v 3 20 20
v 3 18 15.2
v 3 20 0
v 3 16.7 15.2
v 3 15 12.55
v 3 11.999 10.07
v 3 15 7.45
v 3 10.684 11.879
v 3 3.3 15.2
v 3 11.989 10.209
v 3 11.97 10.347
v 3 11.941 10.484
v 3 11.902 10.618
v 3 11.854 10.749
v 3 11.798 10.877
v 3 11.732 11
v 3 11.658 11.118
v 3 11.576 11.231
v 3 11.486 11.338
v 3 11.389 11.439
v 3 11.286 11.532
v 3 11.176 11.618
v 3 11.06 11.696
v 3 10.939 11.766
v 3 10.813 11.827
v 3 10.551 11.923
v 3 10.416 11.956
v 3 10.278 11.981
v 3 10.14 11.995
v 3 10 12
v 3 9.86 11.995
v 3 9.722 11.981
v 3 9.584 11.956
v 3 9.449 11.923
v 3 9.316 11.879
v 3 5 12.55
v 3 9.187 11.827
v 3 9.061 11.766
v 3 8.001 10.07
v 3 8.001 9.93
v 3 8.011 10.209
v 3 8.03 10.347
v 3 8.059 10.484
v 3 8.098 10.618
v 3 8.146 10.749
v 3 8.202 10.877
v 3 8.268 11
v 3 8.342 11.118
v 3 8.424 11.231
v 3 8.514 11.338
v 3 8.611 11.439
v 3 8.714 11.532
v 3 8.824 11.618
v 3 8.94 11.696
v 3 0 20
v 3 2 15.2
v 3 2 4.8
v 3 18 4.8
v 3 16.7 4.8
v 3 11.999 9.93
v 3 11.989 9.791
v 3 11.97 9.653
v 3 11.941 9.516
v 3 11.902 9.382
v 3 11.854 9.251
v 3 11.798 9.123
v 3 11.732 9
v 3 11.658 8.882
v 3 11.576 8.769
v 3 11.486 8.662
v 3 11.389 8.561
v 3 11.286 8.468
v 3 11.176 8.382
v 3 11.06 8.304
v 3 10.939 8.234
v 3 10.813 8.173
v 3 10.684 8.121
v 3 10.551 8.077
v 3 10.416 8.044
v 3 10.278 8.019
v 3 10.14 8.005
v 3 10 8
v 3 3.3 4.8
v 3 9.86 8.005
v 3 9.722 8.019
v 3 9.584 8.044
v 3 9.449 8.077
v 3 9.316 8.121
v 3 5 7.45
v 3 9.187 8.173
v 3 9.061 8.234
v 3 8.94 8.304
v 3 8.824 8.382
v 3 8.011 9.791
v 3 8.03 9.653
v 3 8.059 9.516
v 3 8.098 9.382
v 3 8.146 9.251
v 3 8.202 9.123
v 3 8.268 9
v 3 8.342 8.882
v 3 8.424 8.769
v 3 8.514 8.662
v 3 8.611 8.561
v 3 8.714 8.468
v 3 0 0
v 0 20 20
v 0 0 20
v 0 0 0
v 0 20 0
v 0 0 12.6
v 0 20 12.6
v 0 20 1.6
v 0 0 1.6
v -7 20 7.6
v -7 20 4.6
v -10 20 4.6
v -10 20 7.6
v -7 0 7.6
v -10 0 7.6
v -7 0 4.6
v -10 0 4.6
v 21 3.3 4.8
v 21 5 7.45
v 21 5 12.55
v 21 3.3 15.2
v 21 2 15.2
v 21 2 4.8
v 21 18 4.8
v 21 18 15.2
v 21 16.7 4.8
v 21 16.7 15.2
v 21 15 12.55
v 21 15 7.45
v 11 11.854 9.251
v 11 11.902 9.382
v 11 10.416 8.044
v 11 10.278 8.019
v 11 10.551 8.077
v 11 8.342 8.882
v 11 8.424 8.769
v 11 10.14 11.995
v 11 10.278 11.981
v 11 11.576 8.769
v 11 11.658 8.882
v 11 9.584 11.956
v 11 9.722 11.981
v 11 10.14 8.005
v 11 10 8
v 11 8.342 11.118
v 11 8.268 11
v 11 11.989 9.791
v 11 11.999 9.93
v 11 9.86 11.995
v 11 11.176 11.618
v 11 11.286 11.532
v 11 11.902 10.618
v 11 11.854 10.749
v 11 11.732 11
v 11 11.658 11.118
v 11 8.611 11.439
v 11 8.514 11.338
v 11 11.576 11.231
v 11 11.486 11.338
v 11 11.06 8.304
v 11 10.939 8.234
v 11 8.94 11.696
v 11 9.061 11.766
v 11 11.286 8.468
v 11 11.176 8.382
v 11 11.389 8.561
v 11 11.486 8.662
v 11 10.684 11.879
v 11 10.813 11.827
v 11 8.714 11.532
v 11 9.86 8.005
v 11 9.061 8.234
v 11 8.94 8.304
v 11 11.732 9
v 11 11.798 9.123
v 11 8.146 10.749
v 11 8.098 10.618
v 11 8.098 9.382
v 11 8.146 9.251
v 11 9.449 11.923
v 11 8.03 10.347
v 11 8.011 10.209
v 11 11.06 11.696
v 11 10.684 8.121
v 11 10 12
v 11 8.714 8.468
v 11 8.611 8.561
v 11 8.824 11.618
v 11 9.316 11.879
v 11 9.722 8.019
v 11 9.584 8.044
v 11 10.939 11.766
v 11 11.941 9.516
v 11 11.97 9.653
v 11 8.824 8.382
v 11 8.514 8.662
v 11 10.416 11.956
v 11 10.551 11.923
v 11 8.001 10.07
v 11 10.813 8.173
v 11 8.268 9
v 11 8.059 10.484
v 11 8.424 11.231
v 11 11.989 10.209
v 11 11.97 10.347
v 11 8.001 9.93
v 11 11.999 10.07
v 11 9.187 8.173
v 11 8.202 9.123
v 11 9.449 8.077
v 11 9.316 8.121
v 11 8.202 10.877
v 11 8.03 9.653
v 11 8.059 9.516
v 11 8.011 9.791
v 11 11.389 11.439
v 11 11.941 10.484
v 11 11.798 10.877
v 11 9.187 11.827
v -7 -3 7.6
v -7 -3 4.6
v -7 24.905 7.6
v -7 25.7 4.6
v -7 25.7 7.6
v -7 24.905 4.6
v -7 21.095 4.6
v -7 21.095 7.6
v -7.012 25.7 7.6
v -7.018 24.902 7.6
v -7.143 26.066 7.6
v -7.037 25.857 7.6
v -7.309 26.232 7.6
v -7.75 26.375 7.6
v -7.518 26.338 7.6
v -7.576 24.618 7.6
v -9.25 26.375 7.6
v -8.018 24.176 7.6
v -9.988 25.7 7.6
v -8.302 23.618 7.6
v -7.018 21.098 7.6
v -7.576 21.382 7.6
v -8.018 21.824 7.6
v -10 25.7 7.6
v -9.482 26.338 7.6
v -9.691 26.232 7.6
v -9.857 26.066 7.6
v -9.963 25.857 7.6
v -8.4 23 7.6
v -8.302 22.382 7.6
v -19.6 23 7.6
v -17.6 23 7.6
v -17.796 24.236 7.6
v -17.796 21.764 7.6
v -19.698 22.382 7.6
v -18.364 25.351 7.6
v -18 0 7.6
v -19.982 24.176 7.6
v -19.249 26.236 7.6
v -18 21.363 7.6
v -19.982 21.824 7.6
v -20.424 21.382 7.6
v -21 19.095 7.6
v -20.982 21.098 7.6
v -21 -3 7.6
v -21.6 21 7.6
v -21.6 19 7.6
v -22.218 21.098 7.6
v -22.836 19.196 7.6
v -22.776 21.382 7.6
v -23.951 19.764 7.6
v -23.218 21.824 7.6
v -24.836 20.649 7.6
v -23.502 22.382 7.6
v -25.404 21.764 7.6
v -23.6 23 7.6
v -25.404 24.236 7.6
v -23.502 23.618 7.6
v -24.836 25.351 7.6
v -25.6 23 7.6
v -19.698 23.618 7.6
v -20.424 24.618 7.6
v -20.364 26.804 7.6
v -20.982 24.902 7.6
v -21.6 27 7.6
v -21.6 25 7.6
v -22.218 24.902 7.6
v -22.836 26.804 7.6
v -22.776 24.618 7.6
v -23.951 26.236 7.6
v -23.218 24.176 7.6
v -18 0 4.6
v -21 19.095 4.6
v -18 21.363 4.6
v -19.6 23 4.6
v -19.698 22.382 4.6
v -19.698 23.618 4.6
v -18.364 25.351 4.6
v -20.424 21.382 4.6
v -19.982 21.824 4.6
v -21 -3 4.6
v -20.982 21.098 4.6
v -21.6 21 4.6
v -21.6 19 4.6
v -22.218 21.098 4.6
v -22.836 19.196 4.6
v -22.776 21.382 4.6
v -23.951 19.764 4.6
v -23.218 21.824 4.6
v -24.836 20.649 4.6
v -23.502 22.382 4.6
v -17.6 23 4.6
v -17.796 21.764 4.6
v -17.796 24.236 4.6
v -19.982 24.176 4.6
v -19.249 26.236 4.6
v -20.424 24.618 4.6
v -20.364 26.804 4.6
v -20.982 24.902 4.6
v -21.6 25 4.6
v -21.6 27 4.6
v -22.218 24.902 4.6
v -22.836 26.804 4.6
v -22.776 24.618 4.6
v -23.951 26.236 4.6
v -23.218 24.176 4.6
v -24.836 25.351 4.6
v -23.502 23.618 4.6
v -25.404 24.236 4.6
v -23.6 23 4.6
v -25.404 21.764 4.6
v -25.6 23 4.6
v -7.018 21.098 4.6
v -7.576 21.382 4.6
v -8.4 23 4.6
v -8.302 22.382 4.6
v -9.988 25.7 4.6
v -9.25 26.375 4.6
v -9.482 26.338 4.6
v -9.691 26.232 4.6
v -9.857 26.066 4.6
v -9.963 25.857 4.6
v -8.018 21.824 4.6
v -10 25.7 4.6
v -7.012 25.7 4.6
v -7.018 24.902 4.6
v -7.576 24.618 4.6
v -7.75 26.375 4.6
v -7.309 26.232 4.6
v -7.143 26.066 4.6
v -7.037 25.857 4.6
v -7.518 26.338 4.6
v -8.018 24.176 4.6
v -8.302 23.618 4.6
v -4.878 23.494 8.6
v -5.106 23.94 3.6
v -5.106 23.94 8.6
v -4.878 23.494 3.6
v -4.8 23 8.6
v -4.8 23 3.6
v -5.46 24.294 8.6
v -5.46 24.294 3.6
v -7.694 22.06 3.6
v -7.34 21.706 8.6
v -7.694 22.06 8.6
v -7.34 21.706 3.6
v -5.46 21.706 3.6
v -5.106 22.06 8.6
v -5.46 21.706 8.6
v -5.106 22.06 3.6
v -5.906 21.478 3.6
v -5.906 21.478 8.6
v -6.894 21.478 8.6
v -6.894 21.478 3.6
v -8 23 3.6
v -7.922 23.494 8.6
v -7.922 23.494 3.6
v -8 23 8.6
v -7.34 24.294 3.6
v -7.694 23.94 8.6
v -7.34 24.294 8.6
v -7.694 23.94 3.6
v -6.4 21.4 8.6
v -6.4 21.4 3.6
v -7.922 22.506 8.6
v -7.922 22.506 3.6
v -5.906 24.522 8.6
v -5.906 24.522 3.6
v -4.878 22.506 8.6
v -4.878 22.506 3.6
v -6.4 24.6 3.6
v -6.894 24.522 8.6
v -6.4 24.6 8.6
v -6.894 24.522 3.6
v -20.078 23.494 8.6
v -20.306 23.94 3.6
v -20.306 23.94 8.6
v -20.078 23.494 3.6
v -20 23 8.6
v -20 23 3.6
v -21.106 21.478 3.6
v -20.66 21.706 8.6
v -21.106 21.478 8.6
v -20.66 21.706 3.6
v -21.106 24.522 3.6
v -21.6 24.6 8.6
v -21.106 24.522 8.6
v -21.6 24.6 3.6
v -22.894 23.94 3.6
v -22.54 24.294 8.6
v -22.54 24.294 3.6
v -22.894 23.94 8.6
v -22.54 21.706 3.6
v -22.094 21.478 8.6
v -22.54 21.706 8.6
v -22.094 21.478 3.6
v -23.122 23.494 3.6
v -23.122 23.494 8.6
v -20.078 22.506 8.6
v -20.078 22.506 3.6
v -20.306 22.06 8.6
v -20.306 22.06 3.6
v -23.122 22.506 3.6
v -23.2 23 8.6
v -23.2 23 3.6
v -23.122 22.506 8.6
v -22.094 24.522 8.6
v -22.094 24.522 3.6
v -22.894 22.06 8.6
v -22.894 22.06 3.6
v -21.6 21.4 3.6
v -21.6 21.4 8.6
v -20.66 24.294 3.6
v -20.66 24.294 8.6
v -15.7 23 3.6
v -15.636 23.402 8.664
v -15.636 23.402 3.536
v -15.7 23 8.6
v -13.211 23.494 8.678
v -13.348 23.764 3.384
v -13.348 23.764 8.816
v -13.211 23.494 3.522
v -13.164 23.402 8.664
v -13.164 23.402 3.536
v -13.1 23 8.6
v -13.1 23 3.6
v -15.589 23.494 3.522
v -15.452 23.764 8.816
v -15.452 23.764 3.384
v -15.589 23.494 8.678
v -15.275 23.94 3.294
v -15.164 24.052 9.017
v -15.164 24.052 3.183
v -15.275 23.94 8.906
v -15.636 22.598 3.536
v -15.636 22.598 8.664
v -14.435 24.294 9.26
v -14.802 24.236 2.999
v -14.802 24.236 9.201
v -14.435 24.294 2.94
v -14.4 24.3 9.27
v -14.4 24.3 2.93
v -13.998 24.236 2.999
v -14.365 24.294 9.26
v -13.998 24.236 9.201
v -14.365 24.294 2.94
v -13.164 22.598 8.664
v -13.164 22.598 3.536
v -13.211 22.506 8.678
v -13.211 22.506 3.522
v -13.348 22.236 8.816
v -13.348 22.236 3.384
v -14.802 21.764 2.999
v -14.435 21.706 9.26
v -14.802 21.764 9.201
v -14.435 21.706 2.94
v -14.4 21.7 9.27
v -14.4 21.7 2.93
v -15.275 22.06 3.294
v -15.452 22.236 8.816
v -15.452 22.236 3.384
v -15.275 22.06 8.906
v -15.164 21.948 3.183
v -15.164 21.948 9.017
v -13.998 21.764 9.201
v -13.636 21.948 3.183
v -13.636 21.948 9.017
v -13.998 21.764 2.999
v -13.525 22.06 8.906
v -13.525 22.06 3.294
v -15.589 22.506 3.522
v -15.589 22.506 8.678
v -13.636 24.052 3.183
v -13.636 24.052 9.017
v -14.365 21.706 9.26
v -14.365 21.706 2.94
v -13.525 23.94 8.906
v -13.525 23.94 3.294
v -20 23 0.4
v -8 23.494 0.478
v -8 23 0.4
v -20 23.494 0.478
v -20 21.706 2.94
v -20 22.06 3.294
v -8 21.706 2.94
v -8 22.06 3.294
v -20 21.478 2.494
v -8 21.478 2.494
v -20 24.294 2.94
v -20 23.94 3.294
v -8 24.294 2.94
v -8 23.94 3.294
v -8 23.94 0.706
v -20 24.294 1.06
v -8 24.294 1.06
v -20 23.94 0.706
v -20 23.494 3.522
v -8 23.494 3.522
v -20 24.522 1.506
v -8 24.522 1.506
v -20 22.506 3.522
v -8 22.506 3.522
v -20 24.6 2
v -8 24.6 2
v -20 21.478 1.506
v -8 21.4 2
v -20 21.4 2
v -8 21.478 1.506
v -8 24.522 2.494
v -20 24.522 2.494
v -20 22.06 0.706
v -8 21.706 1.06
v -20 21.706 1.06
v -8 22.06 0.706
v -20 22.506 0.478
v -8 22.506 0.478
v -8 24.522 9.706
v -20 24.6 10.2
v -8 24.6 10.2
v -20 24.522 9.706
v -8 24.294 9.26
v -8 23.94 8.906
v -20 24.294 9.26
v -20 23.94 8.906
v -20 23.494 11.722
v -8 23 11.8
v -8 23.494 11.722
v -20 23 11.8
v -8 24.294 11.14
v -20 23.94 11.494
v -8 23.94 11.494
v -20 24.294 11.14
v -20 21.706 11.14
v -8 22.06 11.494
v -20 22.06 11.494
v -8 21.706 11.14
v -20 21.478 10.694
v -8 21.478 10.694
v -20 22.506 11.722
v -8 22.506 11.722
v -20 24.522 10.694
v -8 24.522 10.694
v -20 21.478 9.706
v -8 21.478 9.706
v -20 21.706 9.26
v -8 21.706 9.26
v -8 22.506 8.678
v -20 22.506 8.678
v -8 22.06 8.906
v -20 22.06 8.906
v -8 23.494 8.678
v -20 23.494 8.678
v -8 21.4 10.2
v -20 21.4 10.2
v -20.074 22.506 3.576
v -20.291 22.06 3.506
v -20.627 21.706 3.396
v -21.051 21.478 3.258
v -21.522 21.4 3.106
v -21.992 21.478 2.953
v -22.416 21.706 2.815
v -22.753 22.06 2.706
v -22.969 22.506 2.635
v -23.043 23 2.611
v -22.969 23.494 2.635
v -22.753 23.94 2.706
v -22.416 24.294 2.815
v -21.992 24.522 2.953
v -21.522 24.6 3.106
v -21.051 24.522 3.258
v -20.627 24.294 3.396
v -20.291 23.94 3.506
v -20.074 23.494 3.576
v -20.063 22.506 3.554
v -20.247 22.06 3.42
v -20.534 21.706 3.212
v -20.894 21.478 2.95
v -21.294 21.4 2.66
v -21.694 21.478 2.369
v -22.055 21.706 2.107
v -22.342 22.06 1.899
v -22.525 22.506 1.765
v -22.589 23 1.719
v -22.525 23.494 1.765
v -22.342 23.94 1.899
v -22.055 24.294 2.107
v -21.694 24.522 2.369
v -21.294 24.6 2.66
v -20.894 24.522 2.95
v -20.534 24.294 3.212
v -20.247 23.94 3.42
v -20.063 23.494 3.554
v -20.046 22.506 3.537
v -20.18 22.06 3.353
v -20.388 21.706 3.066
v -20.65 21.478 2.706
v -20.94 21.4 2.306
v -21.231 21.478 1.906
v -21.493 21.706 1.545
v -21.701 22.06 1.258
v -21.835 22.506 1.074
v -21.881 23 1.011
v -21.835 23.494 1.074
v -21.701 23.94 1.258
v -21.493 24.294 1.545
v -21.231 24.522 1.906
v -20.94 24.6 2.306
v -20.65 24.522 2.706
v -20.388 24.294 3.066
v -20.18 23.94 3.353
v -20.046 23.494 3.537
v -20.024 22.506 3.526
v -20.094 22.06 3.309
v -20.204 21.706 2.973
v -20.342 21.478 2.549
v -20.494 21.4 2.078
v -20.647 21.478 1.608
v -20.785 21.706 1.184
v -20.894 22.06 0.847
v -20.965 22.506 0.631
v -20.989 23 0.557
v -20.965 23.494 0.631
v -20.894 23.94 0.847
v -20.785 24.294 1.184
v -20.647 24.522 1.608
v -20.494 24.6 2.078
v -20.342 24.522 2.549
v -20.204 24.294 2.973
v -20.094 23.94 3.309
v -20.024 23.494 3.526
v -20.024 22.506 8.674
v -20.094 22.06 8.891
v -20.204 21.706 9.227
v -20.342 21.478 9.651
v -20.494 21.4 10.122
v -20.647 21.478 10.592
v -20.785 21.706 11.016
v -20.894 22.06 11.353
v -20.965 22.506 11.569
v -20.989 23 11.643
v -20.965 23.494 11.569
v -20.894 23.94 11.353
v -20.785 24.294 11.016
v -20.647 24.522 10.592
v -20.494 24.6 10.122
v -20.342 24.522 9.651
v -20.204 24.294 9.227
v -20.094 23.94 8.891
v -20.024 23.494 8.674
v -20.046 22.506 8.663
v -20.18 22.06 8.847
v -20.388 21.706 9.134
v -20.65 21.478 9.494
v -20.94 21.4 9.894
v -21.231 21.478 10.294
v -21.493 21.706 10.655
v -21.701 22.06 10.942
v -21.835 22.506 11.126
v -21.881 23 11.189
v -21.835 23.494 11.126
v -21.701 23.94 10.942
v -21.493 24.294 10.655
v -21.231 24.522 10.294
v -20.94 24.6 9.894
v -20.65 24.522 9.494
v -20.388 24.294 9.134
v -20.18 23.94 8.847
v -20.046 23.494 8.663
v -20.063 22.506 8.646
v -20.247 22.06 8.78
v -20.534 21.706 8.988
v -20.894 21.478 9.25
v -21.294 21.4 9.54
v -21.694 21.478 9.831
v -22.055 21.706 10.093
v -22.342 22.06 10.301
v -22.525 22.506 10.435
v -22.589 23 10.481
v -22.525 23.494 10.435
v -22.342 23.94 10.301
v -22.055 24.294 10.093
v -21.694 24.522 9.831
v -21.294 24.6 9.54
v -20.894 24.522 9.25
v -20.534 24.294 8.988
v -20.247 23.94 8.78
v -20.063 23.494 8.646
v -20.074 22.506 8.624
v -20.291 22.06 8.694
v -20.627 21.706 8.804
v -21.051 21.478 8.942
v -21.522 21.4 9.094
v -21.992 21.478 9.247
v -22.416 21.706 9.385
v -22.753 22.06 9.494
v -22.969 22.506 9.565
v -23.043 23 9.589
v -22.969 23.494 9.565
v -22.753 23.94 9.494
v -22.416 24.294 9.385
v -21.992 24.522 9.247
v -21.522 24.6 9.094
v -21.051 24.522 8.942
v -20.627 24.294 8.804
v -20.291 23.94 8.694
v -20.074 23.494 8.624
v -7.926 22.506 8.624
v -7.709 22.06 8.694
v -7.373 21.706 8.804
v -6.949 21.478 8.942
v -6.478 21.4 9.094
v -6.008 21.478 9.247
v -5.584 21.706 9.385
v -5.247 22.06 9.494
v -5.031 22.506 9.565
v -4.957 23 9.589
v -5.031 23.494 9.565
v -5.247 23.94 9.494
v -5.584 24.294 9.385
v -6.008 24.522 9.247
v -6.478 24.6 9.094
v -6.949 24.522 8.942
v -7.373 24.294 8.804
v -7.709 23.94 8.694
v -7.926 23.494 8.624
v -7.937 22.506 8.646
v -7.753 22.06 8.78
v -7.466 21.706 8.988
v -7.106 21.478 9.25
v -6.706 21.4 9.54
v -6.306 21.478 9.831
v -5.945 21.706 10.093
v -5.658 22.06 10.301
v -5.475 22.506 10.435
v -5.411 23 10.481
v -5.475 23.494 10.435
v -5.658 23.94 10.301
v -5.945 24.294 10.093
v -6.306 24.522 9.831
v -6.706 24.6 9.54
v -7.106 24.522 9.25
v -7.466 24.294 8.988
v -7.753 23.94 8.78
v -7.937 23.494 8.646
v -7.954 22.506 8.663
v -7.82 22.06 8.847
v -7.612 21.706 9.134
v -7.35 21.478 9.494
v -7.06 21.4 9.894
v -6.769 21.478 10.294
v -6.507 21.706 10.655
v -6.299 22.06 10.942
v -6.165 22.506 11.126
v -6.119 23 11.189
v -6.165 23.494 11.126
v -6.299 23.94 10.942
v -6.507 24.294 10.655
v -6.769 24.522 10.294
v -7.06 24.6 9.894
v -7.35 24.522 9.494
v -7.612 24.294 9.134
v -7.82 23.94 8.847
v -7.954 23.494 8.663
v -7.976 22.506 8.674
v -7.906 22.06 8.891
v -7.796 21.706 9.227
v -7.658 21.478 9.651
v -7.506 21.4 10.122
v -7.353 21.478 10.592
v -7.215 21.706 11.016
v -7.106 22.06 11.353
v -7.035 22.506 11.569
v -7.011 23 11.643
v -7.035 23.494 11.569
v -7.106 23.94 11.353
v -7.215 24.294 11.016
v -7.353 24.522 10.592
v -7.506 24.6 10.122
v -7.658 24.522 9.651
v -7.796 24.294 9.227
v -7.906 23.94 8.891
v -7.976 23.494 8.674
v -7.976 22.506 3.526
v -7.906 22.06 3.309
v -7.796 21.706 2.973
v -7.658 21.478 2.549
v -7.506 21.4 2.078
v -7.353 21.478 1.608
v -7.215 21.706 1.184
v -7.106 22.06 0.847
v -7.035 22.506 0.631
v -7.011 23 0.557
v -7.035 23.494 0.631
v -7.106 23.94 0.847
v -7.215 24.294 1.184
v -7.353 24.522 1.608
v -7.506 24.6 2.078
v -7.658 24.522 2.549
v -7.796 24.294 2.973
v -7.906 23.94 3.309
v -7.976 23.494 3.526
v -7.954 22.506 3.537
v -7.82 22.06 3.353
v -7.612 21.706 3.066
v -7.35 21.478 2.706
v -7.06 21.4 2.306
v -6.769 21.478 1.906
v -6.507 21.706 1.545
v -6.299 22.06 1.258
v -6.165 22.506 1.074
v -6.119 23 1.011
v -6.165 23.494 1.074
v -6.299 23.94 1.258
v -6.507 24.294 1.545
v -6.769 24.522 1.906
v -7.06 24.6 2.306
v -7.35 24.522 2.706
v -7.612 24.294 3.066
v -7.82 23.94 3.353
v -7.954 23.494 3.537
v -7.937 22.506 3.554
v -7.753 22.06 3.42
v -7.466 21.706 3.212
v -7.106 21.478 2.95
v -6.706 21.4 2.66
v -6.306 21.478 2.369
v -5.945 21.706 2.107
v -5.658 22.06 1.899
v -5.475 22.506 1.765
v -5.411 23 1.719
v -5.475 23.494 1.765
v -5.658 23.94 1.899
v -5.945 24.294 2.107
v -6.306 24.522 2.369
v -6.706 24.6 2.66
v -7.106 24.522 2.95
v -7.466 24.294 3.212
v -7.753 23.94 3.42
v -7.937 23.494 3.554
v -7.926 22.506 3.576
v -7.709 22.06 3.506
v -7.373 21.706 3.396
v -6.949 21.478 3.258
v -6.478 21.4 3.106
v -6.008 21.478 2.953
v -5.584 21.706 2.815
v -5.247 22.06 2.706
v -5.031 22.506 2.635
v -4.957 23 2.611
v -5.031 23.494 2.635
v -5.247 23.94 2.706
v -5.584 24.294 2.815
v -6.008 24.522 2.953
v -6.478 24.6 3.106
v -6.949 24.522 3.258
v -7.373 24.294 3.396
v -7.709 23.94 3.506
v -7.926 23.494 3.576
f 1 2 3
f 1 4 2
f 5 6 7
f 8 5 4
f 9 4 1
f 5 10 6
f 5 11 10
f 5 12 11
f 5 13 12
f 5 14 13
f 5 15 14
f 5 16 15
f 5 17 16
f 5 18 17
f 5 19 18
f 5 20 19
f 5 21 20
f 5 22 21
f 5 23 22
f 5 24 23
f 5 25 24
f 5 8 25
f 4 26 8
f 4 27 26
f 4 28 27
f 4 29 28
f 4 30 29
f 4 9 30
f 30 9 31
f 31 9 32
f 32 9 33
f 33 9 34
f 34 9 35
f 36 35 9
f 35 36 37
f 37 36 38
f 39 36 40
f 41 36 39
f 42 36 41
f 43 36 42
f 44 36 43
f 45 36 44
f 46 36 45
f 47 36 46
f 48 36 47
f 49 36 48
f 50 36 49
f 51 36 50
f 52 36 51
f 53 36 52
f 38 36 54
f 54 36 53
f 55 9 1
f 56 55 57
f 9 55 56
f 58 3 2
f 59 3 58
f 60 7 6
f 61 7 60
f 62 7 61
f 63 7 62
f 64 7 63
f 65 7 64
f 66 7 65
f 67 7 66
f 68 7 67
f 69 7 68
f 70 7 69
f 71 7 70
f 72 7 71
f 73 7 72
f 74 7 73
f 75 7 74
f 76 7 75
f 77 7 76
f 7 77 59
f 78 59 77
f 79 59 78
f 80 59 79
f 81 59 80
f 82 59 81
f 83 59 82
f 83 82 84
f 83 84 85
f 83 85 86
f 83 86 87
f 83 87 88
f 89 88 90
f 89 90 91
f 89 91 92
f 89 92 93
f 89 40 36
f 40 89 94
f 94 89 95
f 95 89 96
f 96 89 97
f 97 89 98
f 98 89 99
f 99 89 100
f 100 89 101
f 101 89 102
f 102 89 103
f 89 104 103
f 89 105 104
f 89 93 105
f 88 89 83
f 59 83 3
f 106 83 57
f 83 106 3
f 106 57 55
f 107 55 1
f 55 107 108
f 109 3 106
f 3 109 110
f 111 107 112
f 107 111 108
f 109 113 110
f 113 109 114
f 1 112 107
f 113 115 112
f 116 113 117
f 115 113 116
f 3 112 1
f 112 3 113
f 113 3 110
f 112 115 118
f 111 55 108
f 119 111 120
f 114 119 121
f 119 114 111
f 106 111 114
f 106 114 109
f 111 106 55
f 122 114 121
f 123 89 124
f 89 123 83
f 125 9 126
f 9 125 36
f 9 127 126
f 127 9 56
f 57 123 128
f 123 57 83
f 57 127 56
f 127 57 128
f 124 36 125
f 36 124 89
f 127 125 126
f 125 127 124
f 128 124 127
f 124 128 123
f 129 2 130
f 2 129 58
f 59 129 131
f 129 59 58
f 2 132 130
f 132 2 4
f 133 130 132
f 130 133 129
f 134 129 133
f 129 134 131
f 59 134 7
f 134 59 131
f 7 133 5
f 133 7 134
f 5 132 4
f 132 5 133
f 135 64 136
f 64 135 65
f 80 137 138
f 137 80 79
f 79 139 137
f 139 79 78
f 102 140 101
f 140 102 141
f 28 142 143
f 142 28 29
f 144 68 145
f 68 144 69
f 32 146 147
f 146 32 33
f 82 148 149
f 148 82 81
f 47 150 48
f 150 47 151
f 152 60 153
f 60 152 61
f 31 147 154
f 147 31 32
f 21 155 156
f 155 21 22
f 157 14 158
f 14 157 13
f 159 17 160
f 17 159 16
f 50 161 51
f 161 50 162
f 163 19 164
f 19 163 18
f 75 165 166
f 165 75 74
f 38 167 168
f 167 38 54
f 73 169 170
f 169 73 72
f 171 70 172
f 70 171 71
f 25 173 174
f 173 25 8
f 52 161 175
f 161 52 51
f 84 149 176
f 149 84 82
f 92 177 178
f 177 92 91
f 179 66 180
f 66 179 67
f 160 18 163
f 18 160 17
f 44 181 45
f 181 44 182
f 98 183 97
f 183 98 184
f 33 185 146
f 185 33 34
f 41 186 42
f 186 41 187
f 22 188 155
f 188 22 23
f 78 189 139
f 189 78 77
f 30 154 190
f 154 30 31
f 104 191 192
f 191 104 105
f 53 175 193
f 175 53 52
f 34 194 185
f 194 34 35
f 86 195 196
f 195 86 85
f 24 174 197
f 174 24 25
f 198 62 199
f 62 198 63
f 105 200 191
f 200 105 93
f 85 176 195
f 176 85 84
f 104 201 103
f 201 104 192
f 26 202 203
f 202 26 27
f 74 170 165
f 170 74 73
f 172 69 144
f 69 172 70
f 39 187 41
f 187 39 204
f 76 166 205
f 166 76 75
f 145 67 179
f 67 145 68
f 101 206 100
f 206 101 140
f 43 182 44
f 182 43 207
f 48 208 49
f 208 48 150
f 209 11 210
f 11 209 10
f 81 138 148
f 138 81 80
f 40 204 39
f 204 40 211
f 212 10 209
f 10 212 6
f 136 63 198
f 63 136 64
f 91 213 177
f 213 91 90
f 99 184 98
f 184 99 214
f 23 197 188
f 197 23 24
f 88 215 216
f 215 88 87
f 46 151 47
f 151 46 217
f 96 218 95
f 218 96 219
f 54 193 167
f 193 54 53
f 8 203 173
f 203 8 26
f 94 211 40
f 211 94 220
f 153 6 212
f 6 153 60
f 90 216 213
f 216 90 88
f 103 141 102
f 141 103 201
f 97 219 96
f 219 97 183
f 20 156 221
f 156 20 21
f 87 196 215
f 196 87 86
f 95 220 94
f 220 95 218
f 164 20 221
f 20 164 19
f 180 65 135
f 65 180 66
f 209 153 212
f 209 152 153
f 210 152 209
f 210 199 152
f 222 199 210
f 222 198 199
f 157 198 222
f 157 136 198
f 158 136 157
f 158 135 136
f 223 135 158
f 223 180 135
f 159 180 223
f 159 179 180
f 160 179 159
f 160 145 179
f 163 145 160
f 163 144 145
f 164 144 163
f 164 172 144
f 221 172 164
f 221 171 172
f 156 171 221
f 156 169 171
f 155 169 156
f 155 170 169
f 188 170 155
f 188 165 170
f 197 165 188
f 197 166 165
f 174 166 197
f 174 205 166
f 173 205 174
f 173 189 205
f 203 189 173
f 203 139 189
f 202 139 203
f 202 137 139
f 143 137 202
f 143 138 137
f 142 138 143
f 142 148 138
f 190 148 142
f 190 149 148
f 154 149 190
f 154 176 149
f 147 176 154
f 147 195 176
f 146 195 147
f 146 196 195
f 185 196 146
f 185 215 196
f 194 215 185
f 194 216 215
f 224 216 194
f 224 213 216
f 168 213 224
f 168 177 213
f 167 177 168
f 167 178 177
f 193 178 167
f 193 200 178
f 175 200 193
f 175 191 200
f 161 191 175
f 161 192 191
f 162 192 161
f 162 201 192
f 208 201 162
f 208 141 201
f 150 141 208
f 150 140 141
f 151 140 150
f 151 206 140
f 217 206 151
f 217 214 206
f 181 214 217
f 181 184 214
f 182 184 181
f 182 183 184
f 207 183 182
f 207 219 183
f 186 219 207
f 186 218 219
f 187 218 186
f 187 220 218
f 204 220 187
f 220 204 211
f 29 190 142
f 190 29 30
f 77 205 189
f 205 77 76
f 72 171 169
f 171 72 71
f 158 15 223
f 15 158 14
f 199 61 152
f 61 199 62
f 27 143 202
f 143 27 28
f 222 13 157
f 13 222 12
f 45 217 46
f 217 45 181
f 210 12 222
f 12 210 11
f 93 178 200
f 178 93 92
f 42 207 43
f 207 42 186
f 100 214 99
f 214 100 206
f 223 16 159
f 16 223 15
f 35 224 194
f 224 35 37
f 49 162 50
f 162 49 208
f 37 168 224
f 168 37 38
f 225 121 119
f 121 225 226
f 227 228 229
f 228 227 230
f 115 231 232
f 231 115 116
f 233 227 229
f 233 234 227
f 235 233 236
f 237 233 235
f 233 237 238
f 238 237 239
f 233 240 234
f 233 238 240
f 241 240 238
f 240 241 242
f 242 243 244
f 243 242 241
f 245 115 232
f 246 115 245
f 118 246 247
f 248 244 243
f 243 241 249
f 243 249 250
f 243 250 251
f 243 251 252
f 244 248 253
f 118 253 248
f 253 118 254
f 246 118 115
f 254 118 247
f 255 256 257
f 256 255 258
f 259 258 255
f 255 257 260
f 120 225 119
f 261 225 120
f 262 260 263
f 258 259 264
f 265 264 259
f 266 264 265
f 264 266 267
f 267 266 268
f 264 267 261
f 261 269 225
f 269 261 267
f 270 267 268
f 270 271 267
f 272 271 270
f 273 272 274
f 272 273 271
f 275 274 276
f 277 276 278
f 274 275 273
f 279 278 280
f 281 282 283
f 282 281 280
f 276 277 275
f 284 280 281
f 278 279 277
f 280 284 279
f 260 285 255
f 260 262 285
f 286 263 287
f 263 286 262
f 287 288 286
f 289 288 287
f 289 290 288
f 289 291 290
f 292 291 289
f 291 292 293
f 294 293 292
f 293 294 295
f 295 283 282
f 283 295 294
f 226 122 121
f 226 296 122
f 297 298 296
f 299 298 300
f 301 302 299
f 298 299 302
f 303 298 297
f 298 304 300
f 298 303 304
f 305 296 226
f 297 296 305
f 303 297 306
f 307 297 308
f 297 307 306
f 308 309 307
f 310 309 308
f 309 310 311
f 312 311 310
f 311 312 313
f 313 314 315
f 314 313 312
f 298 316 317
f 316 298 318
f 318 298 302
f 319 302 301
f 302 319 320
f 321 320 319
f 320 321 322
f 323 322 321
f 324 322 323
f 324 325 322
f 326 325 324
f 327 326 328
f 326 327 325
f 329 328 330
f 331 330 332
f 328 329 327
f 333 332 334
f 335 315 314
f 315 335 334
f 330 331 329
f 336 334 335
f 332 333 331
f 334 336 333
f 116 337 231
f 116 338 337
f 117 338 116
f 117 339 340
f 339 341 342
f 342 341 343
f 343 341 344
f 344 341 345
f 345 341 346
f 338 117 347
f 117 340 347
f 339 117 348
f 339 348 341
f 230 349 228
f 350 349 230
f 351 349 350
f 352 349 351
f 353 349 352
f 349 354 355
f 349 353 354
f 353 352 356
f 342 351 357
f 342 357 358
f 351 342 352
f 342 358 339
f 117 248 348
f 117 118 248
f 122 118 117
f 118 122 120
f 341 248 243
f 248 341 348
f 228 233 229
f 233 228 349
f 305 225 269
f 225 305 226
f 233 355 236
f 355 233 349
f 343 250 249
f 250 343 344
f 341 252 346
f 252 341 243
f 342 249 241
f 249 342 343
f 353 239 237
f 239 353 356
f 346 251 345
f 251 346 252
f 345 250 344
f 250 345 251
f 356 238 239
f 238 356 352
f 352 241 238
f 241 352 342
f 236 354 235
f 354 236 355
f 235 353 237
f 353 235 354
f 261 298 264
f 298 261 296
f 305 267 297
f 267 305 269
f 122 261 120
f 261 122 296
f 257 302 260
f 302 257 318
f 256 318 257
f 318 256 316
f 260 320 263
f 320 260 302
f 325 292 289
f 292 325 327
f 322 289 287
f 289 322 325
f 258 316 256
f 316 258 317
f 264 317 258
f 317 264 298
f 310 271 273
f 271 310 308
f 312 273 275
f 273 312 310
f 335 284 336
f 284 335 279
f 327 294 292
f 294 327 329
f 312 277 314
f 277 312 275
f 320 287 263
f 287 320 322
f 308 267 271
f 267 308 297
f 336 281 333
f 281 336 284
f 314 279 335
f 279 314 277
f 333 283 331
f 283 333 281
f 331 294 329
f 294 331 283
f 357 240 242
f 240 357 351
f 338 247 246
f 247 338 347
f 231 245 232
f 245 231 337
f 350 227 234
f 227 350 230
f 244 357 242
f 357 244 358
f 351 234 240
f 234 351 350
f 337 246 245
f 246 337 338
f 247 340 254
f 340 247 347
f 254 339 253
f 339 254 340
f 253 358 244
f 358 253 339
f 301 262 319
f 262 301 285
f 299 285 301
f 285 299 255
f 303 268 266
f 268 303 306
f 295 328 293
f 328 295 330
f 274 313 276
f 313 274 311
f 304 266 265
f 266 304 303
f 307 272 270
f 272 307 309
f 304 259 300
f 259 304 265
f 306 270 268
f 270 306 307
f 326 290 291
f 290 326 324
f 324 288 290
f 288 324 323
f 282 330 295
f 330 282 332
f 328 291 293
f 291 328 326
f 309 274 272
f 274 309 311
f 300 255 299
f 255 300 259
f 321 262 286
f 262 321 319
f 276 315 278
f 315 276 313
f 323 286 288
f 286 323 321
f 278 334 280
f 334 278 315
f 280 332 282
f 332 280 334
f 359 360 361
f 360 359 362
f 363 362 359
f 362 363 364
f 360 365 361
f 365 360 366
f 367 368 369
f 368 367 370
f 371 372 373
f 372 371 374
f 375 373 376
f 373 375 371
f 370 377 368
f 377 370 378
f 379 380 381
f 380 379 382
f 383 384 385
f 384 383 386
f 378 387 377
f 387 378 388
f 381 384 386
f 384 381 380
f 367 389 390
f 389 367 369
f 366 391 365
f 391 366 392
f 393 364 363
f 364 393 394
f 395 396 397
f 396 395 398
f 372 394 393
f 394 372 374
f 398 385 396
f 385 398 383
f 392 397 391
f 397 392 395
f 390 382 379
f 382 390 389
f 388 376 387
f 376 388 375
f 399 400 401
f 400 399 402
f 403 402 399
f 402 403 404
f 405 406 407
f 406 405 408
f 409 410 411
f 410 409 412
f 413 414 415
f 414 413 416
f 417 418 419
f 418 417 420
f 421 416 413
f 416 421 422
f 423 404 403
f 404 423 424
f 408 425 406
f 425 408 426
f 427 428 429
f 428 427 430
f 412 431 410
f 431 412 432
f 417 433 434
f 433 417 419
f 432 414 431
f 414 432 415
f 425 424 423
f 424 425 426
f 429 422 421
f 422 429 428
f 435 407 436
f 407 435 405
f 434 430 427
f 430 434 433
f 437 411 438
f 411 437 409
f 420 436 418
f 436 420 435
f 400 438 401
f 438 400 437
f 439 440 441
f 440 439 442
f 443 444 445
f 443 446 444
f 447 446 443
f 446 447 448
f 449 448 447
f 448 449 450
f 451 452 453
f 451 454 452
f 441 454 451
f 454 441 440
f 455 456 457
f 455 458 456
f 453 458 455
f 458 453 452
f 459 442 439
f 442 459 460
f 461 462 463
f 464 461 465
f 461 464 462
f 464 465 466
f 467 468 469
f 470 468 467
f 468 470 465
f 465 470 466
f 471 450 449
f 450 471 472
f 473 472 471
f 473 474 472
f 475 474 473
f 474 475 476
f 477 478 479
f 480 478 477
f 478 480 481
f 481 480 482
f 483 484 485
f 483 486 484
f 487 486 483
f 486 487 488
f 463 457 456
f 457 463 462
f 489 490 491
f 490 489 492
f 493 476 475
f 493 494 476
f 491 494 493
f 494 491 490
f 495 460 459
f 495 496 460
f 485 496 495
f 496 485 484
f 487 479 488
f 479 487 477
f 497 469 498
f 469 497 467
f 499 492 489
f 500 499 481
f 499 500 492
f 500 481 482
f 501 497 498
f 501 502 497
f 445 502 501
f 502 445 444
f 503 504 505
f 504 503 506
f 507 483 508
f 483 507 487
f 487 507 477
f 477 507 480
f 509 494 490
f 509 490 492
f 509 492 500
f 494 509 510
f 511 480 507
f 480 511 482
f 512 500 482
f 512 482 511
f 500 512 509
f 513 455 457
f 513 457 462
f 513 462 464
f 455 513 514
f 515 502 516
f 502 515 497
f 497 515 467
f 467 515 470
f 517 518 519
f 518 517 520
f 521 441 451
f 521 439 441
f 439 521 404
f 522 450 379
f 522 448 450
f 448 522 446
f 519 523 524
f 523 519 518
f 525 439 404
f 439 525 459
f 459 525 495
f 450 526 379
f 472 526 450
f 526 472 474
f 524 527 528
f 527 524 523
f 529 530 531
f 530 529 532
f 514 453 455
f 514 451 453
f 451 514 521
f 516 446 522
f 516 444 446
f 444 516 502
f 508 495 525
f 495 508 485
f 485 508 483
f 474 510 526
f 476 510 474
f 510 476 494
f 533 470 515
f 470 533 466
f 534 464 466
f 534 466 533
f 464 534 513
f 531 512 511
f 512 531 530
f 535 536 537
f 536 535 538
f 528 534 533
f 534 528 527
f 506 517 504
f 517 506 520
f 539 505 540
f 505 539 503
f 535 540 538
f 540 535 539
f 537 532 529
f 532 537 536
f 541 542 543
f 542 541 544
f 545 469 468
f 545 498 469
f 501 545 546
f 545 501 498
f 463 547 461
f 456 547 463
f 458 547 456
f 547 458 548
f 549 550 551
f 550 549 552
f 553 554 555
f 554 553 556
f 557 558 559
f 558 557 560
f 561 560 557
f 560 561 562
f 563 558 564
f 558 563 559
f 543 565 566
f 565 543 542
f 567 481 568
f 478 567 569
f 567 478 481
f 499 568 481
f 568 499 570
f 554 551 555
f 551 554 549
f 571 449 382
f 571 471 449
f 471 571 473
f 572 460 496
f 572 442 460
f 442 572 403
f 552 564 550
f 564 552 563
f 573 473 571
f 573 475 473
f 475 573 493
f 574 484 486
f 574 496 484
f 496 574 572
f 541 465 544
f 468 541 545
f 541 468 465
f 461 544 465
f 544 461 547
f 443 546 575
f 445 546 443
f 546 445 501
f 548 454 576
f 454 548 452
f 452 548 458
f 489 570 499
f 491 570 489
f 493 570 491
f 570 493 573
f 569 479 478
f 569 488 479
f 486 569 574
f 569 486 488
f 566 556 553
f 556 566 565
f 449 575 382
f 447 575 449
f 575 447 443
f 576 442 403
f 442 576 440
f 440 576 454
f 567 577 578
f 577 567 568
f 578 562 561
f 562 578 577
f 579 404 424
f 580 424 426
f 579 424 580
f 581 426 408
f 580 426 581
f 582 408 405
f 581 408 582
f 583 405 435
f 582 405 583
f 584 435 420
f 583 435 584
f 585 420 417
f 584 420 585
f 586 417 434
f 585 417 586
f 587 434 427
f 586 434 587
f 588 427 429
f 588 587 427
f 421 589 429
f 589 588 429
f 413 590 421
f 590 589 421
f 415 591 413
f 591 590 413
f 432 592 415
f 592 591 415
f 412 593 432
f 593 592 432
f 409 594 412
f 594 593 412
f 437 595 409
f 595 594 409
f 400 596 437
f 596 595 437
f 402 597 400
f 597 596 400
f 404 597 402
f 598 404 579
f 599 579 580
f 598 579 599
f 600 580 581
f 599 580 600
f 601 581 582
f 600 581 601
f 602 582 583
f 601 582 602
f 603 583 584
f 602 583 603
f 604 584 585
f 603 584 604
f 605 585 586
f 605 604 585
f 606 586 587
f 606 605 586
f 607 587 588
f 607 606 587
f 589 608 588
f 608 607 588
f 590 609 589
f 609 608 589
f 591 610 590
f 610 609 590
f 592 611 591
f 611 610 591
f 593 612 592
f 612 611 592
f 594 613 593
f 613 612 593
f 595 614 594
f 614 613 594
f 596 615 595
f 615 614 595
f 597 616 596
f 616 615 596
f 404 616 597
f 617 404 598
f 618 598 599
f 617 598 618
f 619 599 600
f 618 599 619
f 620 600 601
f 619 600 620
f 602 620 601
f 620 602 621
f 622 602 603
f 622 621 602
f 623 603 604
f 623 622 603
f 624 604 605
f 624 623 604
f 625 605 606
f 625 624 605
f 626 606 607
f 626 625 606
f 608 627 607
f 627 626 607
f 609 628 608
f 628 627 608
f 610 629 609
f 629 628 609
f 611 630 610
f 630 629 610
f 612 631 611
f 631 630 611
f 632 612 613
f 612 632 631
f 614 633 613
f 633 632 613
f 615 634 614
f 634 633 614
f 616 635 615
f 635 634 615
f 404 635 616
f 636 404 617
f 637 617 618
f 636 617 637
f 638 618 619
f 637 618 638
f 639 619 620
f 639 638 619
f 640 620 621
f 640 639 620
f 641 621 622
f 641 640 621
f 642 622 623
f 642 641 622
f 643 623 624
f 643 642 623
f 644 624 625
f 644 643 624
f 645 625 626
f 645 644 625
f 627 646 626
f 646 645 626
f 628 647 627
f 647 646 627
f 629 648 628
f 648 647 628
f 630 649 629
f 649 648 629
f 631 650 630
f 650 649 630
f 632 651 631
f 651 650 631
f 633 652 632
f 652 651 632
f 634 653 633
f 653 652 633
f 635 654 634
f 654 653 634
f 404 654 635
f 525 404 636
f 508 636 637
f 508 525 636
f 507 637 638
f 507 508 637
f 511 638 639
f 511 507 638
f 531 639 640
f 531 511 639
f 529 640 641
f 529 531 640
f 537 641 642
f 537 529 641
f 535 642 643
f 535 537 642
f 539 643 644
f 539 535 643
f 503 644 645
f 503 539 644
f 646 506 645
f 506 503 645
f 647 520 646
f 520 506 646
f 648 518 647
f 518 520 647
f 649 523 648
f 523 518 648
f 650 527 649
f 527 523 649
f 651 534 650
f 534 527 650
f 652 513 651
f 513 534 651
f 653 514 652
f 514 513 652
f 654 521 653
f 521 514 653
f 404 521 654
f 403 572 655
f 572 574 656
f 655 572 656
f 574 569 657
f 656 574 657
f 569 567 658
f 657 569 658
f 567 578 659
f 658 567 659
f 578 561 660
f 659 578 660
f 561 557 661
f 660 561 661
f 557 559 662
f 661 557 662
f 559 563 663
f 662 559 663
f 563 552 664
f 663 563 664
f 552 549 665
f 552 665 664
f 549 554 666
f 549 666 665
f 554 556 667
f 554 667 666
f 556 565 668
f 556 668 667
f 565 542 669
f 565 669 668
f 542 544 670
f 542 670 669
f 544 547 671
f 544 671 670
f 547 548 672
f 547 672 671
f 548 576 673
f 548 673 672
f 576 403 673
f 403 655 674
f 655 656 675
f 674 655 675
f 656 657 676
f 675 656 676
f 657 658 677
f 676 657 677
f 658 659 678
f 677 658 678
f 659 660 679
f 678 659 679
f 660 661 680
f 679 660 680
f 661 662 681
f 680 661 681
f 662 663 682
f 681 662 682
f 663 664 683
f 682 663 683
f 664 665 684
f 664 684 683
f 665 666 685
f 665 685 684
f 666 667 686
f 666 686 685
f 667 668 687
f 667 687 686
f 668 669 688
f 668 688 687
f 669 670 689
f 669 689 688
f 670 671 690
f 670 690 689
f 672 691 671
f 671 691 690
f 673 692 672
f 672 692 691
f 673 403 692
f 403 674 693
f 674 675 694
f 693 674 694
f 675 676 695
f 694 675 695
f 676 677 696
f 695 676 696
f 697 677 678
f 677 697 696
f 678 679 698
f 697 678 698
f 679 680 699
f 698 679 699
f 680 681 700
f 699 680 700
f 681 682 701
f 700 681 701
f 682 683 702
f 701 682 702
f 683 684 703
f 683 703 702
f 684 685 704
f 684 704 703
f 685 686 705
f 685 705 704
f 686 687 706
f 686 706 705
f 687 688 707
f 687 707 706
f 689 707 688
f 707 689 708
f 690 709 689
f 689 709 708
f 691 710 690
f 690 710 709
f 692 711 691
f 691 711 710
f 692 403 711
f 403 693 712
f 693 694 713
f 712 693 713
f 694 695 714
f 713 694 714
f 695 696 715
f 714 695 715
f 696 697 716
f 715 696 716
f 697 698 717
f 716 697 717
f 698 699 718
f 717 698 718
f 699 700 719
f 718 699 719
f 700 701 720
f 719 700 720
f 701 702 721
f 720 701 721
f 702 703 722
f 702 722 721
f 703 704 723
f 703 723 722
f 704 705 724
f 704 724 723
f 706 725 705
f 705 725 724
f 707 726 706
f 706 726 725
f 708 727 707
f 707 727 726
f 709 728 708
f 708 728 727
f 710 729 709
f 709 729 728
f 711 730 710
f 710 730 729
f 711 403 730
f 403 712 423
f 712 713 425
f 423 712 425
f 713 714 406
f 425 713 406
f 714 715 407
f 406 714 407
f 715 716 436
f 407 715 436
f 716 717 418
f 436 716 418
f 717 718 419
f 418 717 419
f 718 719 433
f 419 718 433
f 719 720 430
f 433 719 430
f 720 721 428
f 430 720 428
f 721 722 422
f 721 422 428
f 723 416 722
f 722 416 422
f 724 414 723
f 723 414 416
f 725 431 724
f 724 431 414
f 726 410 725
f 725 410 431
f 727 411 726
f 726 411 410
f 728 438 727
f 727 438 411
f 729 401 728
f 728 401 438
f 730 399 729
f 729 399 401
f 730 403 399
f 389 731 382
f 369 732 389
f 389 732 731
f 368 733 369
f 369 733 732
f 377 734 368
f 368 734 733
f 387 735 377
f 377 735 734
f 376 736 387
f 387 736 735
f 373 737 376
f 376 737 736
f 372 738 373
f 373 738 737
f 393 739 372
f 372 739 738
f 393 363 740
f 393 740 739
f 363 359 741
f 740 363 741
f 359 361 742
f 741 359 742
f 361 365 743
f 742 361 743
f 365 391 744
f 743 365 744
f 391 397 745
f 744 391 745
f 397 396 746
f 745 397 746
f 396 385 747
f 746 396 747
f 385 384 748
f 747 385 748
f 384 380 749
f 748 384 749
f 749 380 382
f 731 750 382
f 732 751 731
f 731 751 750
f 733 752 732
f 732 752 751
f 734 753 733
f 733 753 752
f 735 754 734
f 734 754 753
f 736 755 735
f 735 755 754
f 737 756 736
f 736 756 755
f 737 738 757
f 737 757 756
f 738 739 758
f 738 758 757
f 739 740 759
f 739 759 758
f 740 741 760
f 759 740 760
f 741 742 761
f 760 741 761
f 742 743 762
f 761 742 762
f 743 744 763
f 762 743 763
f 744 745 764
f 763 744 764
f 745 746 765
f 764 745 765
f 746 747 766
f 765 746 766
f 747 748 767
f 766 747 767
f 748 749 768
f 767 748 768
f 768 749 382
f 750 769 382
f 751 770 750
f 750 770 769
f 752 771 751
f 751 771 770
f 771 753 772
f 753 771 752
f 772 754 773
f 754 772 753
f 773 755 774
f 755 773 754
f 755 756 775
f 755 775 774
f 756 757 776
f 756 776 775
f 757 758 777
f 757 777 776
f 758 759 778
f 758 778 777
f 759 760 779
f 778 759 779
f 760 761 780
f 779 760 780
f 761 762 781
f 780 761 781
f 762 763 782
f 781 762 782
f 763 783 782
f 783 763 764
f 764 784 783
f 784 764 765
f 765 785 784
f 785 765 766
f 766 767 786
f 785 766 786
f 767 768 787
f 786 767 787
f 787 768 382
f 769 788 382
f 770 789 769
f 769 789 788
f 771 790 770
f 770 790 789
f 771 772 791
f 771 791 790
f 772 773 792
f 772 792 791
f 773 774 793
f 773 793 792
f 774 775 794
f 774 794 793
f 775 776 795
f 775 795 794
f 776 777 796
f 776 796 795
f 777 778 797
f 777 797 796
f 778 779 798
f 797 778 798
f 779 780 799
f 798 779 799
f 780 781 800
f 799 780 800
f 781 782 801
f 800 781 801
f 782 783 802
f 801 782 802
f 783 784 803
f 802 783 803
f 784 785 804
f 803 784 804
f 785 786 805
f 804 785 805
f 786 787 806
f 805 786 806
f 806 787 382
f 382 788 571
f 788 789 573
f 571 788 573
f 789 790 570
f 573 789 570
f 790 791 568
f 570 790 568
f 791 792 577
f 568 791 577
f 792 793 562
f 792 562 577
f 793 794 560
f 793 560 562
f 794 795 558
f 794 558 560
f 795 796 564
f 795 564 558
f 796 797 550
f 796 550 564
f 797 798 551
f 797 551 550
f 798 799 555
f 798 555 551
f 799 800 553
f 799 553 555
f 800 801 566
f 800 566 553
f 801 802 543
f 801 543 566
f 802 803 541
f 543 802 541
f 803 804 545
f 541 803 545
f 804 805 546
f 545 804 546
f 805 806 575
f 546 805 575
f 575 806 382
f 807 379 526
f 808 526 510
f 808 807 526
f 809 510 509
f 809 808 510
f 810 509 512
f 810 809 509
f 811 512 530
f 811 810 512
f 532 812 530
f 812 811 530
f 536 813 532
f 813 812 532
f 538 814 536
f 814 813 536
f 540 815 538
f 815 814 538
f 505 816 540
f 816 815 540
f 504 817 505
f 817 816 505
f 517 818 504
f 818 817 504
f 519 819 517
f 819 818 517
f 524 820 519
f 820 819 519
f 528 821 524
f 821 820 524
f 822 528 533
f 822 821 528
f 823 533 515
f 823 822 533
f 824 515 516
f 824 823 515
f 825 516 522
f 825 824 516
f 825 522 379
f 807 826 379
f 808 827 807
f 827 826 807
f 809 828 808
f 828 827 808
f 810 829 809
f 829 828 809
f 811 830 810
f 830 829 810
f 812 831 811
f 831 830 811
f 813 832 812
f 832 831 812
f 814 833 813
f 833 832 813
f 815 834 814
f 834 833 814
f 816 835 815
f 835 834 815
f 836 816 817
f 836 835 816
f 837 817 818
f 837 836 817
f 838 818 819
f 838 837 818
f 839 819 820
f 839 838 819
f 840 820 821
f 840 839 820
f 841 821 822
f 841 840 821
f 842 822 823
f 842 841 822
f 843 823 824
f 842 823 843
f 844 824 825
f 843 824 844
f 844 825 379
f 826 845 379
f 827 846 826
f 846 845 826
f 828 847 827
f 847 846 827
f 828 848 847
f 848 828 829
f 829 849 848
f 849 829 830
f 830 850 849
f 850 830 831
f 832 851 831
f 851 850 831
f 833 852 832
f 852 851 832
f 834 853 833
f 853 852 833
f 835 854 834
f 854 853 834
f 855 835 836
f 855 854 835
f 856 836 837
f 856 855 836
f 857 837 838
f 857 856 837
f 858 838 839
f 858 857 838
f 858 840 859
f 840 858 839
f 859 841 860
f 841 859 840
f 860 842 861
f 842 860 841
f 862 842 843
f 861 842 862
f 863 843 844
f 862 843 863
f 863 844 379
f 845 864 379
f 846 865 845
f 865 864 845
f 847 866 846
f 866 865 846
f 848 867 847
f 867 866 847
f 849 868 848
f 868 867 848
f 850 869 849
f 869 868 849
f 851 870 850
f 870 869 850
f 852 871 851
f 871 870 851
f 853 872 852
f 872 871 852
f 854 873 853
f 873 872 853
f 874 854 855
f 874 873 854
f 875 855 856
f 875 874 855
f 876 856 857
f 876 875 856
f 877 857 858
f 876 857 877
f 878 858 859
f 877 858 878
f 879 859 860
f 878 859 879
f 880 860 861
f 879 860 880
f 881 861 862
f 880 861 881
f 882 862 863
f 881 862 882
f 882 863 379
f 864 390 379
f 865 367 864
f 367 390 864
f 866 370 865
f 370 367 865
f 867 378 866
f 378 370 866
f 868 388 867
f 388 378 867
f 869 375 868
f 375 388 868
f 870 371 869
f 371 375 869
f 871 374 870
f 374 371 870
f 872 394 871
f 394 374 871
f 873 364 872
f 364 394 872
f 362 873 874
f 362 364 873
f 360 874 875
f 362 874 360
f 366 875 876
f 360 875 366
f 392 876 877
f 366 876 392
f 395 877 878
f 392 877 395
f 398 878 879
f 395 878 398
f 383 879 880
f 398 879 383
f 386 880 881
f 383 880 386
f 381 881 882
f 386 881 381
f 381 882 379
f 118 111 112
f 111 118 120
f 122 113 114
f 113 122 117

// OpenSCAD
// TODO FSC: chamfer the edges!


block_width = 20;
side_height = 10.4;
side_height2 = 5.1;
module endcap()
{
    cube([3,block_width,block_width]);
    hull()
    {
        translate([3,2,(block_width - side_height)/2]) cube([18,1.3,side_height]);
        translate([3,3.7,(block_width - side_height2)/2]) cube([18,1.3,side_height2]);
    }
    hull()
    {
        translate([3,block_width-2-1.3,(block_width - side_height)/2]) cube([18,1.3,side_height]);
        translate([3,block_width-3.7-1.3,(block_width - side_height2)/2]) cube([18,1.3,side_height2]);
    }
    translate([3, 10,10]) rotate([0,90,0]) cylinder(h=8, d=4, $fn=90);
}

module holder_arms()
{
    arm_separation = 15;
    arm_thickness = 2.5;
    arm_length = 12;
    arm_a = block_width/2 - arm_separation/2 - arm_thickness;
    arm_b = block_width/2 + arm_separation/2;
    translate([-arm_length,arm_a,(block_width-arm_thickness)/2]) cube([arm_length,arm_thickness,arm_thickness]);
    translate([-arm_length,arm_b,(block_width-arm_thickness)/2]) cube([arm_length,arm_thickness,arm_thickness]);

    translate([-arm_length,arm_a+4+arm_thickness,(block_width-arm_thickness)/2]) mirror([0,1,0]) rotate(90) rotate_extrude(angle=50, $fn=30) translate([4,0,0]) square([arm_thickness,arm_thickness]);
    translate([-arm_length,arm_b-(4),(block_width-arm_thickness)/2]) rotate(90) rotate_extrude(angle=50, $fn=30) translate([4,0,0]) square([arm_thickness,arm_thickness]);
}

module holder_prop()
{
    dist_from_endcap = 10;
    gap_for_tool = 8;
    structure_width = 3;
    tool_gap_length = 20;
    tool_holder_length = tool_gap_length + 2 * structure_width;
    
    // separation from endcap cube
    translate([-dist_from_endcap, (block_width - tool_gap_length) / 2, 0]) cube([dist_from_endcap, tool_gap_length, structure_width]);
    
    // support to endcap
    color("red") hull()
    {
        translate([0,0,structure_width+3]) cube([1,block_width,2]);
        translate([-10,0,structure_width-1]) cube([11,block_width,1]);
    }
    color("red") hull()
    {
        translate([0,0,-3]) cube([1,block_width,2]);
        translate([-10,0,0]) cube([11,block_width,1]);
    }
    
    // tool holder
    difference()
    {
        union()
        {
            // Nearest bar arm
            translate([-dist_from_endcap, (block_width - tool_holder_length) / 2, 0]) cube([structure_width, tool_holder_length + 0.9*structure_width, structure_width]);
            hull()
            {
                rad = structure_width / 4;
                translate([-dist_from_endcap + rad, structure_width - rad/2 + (block_width + tool_holder_length) / 2, 0]) cylinder(r=rad, h=structure_width, $fn=20);
                translate([-dist_from_endcap + structure_width - rad, structure_width - rad/2 + (block_width + tool_holder_length) / 2, 0]) cylinder(r=rad, h=structure_width, $fn=20);
            }
            
            // Furthest bar arm
            translate([-dist_from_endcap - gap_for_tool - structure_width, (block_width - tool_holder_length) / 2, 0]) cube([structure_width, tool_holder_length, structure_width]);
            
            // Connecting bar arm
            translate([-dist_from_endcap - gap_for_tool - structure_width, (block_width - tool_holder_length) / 2, 0]) cube([gap_for_tool + 2 * structure_width, structure_width, structure_width]);
            
            translate([-dist_from_endcap - gap_for_tool - 1.2*structure_width, (block_width + tool_holder_length) / 2, 0]) cylinder(r=structure_width+1, h = structure_width, $fn=20);
        }
        translate([-dist_from_endcap + 1.2*structure_width, (block_width + tool_holder_length) / 2, -1]) cylinder(r=2, h = structure_width + 2, $fn=20);
        translate([-dist_from_endcap - gap_for_tool - 1.2*structure_width, (block_width + tool_holder_length) / 2, -1]) cylinder(r=2, h = structure_width + 2, $fn=20);
    }
    
    // Loop
    translate([-dist_from_endcap + 1.2*structure_width, (block_width + tool_holder_length) / 2, -1])
    {
        loop_rad = 1.6;
        // Two rods
        cylinder(r = loop_rad, h = structure_width+2, $fn = 20);
        translate([ - gap_for_tool - 2.4*structure_width, 0, 0]) cylinder(r = loop_rad, h = structure_width+2, $fn = 20);
        
        // Extra rod
        translate([ - gap_for_tool, 0, -loop_rad]) cylinder(r = loop_rad - 0.3, h = structure_width + 2 + 2*loop_rad, $fn = 20);
        
        //Two bars
        translate([-loop_rad,0,-loop_rad]) rotate([0,-90,0]) cylinder(r = loop_rad, h = gap_for_tool + 2.4*structure_width - 2*loop_rad, $fn = 20);
        translate([-loop_rad,0,structure_width + 2 + loop_rad]) rotate([0,-90,0]) cylinder(r = loop_rad, h = gap_for_tool + 2.4*structure_width - 2*loop_rad, $fn = 20);
        
        // Corners
        translate([-(gap_for_tool + 2.4*structure_width - loop_rad),0,0]) rotate([90, 0, 0]) rotate_extrude(angle=90, $fn=20) translate([-loop_rad,0,0]) circle(r=loop_rad, $fn=20);
        translate([-(gap_for_tool + 2.4*structure_width - loop_rad),0,structure_width + 2]) rotate([90, 90, 0]) rotate_extrude(angle=90, $fn=20) translate([-loop_rad,0,0]) circle(r=loop_rad, $fn=20);
        translate([-loop_rad,0,structure_width + 2]) rotate([90, 180, 0]) rotate_extrude(angle=90, $fn=20) translate([-loop_rad,0,0]) circle(r=loop_rad, $fn=20);
        translate([-loop_rad,0,0]) rotate([90, 270, 0]) rotate_extrude(angle=90, $fn=20) translate([-loop_rad,0,0]) circle(r=loop_rad, $fn=20);
    }
    
}

endcap();
translate([0, 0, 1+2+1.6]) holder_prop();
